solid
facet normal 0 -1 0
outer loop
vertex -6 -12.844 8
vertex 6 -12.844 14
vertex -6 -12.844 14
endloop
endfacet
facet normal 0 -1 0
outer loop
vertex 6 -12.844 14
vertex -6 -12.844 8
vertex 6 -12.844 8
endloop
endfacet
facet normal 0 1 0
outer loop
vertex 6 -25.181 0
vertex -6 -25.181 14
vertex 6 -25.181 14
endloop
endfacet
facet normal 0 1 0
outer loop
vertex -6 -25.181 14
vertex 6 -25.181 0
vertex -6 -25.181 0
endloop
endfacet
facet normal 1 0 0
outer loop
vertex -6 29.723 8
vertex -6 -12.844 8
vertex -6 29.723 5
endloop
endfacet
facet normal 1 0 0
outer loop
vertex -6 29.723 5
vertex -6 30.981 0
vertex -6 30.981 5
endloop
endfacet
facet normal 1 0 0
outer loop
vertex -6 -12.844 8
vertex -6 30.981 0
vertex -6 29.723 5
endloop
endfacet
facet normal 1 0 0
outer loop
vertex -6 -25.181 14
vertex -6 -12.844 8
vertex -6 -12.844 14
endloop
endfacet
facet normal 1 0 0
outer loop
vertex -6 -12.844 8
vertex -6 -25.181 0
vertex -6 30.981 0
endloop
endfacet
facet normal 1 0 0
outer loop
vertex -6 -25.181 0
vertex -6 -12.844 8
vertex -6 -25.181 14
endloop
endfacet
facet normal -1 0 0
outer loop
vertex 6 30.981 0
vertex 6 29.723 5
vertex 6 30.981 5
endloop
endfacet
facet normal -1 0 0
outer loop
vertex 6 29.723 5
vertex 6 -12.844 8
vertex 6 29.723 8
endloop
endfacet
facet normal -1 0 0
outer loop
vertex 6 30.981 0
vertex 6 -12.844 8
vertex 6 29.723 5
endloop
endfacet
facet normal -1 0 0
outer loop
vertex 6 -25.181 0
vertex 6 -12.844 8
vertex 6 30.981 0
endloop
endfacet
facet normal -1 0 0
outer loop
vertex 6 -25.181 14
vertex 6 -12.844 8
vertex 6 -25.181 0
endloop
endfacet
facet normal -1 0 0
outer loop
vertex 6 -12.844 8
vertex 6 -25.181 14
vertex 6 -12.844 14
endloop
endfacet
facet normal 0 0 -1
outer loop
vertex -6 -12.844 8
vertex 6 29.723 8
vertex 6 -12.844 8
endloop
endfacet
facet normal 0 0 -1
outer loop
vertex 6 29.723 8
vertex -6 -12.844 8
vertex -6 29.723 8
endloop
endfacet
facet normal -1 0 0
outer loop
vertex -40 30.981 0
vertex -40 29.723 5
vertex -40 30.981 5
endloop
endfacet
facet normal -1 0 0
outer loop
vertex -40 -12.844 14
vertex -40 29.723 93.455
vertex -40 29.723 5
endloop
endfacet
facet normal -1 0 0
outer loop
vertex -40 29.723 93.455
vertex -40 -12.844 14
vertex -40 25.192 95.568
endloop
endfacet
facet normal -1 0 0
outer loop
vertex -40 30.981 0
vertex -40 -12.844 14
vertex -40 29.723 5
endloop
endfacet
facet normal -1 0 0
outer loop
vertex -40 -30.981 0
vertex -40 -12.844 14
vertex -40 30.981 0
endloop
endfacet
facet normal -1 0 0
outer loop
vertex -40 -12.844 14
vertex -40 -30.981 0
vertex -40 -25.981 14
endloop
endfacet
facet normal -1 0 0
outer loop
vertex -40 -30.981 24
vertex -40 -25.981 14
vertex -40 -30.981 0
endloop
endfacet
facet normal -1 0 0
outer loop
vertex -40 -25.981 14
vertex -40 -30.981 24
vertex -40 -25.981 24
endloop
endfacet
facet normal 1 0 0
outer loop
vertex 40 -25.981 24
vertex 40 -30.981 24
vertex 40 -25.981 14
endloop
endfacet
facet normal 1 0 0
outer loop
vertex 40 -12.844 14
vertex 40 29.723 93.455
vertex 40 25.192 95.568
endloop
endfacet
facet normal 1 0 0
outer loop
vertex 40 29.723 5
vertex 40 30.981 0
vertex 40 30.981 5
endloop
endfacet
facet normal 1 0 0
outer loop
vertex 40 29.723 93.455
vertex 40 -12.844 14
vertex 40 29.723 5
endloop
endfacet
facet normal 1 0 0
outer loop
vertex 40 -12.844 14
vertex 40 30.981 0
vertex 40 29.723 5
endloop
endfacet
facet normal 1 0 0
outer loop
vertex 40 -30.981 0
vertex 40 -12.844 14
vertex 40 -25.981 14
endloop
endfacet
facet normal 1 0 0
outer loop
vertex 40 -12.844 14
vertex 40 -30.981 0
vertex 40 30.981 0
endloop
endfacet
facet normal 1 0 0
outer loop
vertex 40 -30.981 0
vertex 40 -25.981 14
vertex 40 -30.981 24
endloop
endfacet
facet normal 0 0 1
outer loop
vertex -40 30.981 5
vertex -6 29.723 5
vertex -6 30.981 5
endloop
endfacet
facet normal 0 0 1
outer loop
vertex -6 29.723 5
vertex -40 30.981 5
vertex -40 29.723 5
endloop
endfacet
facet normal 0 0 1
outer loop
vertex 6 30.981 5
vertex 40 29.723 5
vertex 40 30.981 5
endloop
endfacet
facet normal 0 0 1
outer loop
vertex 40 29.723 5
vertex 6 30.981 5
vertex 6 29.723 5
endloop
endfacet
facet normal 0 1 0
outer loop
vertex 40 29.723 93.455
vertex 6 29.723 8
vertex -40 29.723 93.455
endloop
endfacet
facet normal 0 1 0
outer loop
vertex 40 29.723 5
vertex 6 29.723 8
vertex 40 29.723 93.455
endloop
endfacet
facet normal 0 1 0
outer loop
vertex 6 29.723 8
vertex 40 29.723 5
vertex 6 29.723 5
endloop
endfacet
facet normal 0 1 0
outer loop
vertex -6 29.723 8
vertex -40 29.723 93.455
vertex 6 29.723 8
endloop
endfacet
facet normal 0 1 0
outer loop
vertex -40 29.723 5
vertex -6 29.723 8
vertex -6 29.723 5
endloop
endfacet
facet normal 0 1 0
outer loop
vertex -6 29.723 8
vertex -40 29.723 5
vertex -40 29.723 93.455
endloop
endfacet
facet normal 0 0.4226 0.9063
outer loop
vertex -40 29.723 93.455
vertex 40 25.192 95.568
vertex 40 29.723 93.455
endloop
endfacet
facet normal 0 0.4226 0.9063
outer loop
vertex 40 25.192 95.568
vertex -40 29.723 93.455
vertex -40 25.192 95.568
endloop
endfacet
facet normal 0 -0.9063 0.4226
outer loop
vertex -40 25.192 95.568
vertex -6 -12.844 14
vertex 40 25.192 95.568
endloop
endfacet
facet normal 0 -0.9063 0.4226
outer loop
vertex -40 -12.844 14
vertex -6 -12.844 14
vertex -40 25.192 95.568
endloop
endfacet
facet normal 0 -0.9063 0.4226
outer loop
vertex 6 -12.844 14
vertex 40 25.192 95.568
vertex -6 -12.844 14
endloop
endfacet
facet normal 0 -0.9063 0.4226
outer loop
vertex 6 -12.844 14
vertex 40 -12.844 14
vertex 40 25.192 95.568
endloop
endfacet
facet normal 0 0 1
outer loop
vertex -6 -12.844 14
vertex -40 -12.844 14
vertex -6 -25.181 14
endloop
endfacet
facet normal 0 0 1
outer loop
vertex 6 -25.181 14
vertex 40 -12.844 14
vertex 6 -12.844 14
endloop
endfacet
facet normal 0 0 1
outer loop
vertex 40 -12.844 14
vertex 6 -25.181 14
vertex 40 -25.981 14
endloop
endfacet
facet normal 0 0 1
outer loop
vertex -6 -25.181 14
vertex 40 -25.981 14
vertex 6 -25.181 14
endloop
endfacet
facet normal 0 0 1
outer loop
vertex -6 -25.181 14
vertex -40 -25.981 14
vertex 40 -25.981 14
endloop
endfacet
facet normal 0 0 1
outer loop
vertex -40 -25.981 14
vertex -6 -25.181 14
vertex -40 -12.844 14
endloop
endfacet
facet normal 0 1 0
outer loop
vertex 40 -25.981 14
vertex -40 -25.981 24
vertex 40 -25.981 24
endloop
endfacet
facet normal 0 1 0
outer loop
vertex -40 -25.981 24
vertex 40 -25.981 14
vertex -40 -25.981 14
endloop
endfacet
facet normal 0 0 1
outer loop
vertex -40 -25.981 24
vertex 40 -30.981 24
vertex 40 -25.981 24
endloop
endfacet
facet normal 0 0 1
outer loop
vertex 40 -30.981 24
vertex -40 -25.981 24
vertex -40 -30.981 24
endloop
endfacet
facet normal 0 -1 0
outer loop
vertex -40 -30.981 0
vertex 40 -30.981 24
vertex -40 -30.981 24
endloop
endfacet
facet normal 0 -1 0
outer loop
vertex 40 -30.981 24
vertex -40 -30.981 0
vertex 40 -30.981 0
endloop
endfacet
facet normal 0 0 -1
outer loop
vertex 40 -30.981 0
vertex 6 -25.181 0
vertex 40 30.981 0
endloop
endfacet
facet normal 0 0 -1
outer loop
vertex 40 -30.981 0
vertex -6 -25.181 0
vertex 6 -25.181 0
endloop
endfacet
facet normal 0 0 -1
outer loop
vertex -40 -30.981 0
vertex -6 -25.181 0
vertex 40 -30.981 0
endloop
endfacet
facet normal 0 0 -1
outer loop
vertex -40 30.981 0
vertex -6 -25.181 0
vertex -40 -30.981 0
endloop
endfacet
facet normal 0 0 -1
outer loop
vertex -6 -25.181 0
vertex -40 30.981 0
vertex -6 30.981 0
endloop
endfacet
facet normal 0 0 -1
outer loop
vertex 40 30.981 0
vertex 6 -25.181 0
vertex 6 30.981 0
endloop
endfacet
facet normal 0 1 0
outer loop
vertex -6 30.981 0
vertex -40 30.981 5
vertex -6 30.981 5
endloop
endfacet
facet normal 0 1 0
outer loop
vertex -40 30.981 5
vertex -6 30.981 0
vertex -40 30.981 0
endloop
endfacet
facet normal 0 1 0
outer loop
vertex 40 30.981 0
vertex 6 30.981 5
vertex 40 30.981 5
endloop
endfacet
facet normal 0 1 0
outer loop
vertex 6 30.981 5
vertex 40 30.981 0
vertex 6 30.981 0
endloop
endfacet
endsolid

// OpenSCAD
// Phone / tablet stand — the device leans back against a backrest with its
// bottom edge in a slot behind a front lip. Three styles: a solid wedge, a
// lightweight A-frame with windows cut through the backrest, and a
// constant-thickness folded plate. Optional cable pass-through (a slot in
// the floor under the charging port, and a channel along the underside to
// the back) and optional text inlaid flush in the front face of the lip.
//
// Prints upright on its base, the way it stands on the desk, without
// supports: the backrest leans back by at most 40 degrees from vertical, the
// windows have 50-degree pointed tops, and the cable channel and the folded
// floor are short bridges. The base is lengthened automatically so the
// device's centre of mass always sits well inside the footprint.
//
// Written to the MakerWorld Parametric Model Maker customizer conventions so
// the same file works unchanged on MakerWorld and in ScadBuddy.
//
// The colour parameters are the extruder order: stand_color is extruder 1,
// front_color extruder 2, text_color extruder 3. Colours that are equal merge
// into one part and one filament.

/* [Device] */

// Device thickness including its case, in mm
device_thickness = 11; // [4:0.5:30]

// Height of the device as it stands in the stand, in mm (the long side for portrait); only used to keep it from tipping
device_height = 160; // [60:5:350]

// Extra room in the slot, in mm
clearance = 1; // [0.4:0.1:3]

/* [Stand] */

// Style of the stand
style = "solid"; // [solid:Solid wedge, cutout:Cut-out - lightweight A-frame, folded:Folded plate]

// Viewing angle: backrest tilt from the desk, in degrees (90 would be upright)
angle = 65; // [50:1:80]

// Width of the stand, in mm (a tablet in landscape wants 150+)
width = 80; // [40:5:250]

// Length of the backrest along its slope, from the slot floor, in mm
backrest_length = 90; // [30:5:250]

// Height of the lip in front of the device, above the slot floor, in mm
lip_height = 10; // [3:1:40]

// Height of the slot floor above the desk, in mm (room under the device for a charging plug; at least thickness + 1)
floor_height = 14; // [4:1:40]

// Wall / plate thickness, in mm
thickness = 5; // [3:0.5:10]

/* [Cable] */

// Cable pass-through: a slot in the floor under the charging port and a channel along the underside to the back
cable_slot = true;

// Width of the cable slot and channel, in mm (fits the plug, not just the cable; capped at width - 2 x thickness)
cable_width = 12; // [6:1:24]

// Height of the channel along the underside, in mm (clamped to 2 mm below the slot floor)
cable_channel_height = 8; // [4:1:20]

/* [Text] */

// Text inlaid in the front face of the lip (leave empty for none)
text = ""; // 30

// Typeface
font = "DejaVu Sans:style=Bold"; // font

// Text size in mm; shrinks automatically to fit the front face
text_size = 10; // [4:1:40]

/* [Colors] */

// Stand colour (extruder 1)
stand_color = "#546E7A"; // color

// Front lip colour (extruder 2; set it to the stand colour for one piece)
front_color = "#FF7043"; // color

// Text colour (extruder 3)
text_color = "#FFFFFF"; // color

/* [Hidden] */

$fn = 48;

a = angle;
t = thickness;
fz = max(floor_height, t + 1);           // slot floor height
u = [cos(a), sin(a)];                     // up the backrest
n = [sin(a), -cos(a)];                    // from backrest front face into it

// Slot: the device's back lies on the backrest front face, its bottom edge on
// the floor, so the floor between lip and backrest is thickness / sin(angle).
slot_w = device_thickness / sin(a) + clearance;
xb0 = t + slot_w;                         // backrest front face at the floor
P0 = [xb0, fz];
T1 = P0 + backrest_length * u;            // backrest top, front
T2 = T1 + t * n;                          // backrest top, back
B2 = P0 + t * n;                          // backrest bottom, back
lip_top = fz + lip_height;

// Folded plate: the rear leg leaves the back of the backrest two thirds of
// the way up and drops to the desk at 65 degrees (a 25-degree overhang).
leg_a = 65;
leg_top = P0 + 0.65 * backrest_length * u + (t / 2) * n;
leg_foot = [leg_top[0] + (leg_top[1] - t / 2) / tan(leg_a), t / 2];
x_leg = leg_foot[0];

// Device centre of mass (x): its back-bottom corner is at P0, it leans at the
// angle. The base runs at least 15 mm behind it (and behind the backrest).
dev_com_x = xb0 + device_height / 2 * cos(a) - device_thickness / 2 * sin(a);
x_struct = style == "folded" ? x_leg + t / 2 + 10 : T2[0];
x_rear = max(x_struct, dev_com_x + 15);
echo(STAND = [x_rear, dev_com_x, xb0, T1[1], slot_w, fz]);

cw = min(cable_width, width - 2 * t);
ch = min(cable_channel_height, fz - 2);
if (floor_height < fz)
    echo(str("NOTE: floor_height raised from ", floor_height, " to ", fz, " mm (thickness + 1)"));
if (cable_slot && cw < cable_width)
    echo(str("NOTE: cable_width reduced from ", cable_width, " to ", cw, " mm to leave the side walls"));
if (cable_slot && ch < cable_channel_height)
    echo(str("NOTE: cable_channel_height reduced from ", cable_channel_height, " to ", ch,
             " mm (2 mm below the slot floor)"));

// ---- side profile: x from the front face (0) back, y up ----------------------

module solid_profile() {
    polygon([[0, 0], [0, lip_top], [t, lip_top], [t, fz], P0, T1, T2, [T2[0], 0]]);
    square([x_rear, t]);
}

module profile() {
    if (style == "folded") {
        square([t, lip_top]);                                   // front plate
        if (fz <= 2 * t) square([xb0 + t, fz]);                 // low floor: solid
        else {
            translate([0, fz - t]) square([xb0 + t, t]);        // floor, bridged
            translate([xb0, 0]) square([t, fz]);                // rear plate
        }
        polygon([P0, T1, T2, B2]);                              // backrest
        hull() {                                                // rear leg
            translate(leg_top) circle(d = t);
            translate(leg_foot) circle(d = t);
        }
        translate([x_leg - t / 2, 0]) square([x_rear - x_leg + t / 2, t]);  // tail
    } else if (style == "cutout") {
        difference() {
            solid_profile();
            offset(delta = -t) polygon([[xb0, 0], P0, T1, T2, [T2[0], 0]]);
        }
    } else {
        solid_profile();
    }
}

// ---- 3D, in the model frame: x back, y across, z up -------------------------

module body3d() {
    rotate([90, 0, 0]) linear_extrude(width, center = true) profile();
}

// Windows through the backrest (cut-out style): pointed tops, 50 degrees.
win_z0 = max(lip_top, fz + 0.2 * backrest_length * sin(a)) + 2;
win_z1 = fz + 0.85 * backrest_length * sin(a);
win_rail = max(8, width * 0.15);
win_hw = min(width / 2 - win_rail, (win_z1 - win_z0) / 1.2);
has_windows = win_hw > 4 && win_z1 - win_z0 > 8;
if (style == "cutout" && !has_windows)
    echo("NOTE: no room for windows in the backrest (raise backrest_length or lower lip_height); the cut-out is hollow inside only");
module windows() {
    if (style == "cutout" && has_windows)
        translate([t + 1, 0, 0]) rotate([90, 0, 90]) linear_extrude(x_rear)
            polygon([[-win_hw, win_z0], [win_hw, win_z0], [win_hw, win_z1 - 1.2 * win_hw],
                     [0, win_z1], [-win_hw, win_z1 - 1.2 * win_hw]]);
}

module cable_cut() {
    if (cable_slot) {
        // Through the floor, under the charging port, down to the desk.
        translate([t + 0.8, -cw / 2, -1]) cube([xb0 - t - 0.8, cw, fz + 2]);
        // Channel along the underside to the back.
        translate([t + 0.8, -cw / 2, -1]) cube([x_rear, cw, ch + 1]);
    }
}

module stand3d() {
    difference() { body3d(); windows(); cable_cut(); }
}

// ---- text on the front face of the lip ---------------------------------------

has_text = len(text) > 0;
text_depth = min(1, t - 1.5);
tmargin = 1.5;
text_w = width - 2 * tmargin - 2;
text_h = lip_top - 2 * tmargin;

// Shrink-only fit (see models/name-sign): resize() scales to the bounding box
// of its children, and a hair-thin bar of the target length makes that box at
// least the target, so text already smaller is left alone.
module fit_x(w) {
    projection(cut = true) translate([0, 0, -0.5])
        resize([w, 0, 0], auto = [false, true, false])
            union() {
                linear_extrude(1) children();
                translate([-w / 2, 0, 10]) cube([w, 0.01, 0.01]);
            }
}
module fit_y(h) {
    projection(cut = true) translate([0, 0, -0.5])
        resize([0, h, 0], auto = [true, false, false])
            union() {
                linear_extrude(1) children();
                translate([0, -h / 2, 10]) cube([0.01, h, 0.01]);
            }
}

module text_2d() {
    fit_y(text_h) fit_x(text_w)
        text(text, size = text_size, font = font, halign = "center", valign = "center");
}

// The front face is the plane x = 0, seen from -x: text right is -y, up is +z.
module text3d() {
    translate([-0.01, 0, lip_top / 2]) rotate([90, 0, -90]) mirror([0, 0, 1])
        linear_extrude(text_depth + 0.01) text_2d();
}

// ---- colour regions -----------------------------------------------------------

module front_region() { translate([-1, -width, -1]) cube([t + 1, 2 * width, lip_top + 2]); }

module front_part() {
    difference() {
        intersection() { stand3d(); front_region(); }
        if (has_text) text3d();
    }
}
module rest_part() { difference() { stand3d(); front_region(); } }
module text_part() { intersection() { stand3d(); text3d(); } }

// Plate: the front faces -Y (towards the viewer), width runs along X.
rotate([0, 0, 90]) translate([-x_rear / 2, 0, 0]) {
    color(stand_color) rest_part();
    color(front_color) front_part();
    if (has_text && text_h > 3) color(text_color) text_part();
}
